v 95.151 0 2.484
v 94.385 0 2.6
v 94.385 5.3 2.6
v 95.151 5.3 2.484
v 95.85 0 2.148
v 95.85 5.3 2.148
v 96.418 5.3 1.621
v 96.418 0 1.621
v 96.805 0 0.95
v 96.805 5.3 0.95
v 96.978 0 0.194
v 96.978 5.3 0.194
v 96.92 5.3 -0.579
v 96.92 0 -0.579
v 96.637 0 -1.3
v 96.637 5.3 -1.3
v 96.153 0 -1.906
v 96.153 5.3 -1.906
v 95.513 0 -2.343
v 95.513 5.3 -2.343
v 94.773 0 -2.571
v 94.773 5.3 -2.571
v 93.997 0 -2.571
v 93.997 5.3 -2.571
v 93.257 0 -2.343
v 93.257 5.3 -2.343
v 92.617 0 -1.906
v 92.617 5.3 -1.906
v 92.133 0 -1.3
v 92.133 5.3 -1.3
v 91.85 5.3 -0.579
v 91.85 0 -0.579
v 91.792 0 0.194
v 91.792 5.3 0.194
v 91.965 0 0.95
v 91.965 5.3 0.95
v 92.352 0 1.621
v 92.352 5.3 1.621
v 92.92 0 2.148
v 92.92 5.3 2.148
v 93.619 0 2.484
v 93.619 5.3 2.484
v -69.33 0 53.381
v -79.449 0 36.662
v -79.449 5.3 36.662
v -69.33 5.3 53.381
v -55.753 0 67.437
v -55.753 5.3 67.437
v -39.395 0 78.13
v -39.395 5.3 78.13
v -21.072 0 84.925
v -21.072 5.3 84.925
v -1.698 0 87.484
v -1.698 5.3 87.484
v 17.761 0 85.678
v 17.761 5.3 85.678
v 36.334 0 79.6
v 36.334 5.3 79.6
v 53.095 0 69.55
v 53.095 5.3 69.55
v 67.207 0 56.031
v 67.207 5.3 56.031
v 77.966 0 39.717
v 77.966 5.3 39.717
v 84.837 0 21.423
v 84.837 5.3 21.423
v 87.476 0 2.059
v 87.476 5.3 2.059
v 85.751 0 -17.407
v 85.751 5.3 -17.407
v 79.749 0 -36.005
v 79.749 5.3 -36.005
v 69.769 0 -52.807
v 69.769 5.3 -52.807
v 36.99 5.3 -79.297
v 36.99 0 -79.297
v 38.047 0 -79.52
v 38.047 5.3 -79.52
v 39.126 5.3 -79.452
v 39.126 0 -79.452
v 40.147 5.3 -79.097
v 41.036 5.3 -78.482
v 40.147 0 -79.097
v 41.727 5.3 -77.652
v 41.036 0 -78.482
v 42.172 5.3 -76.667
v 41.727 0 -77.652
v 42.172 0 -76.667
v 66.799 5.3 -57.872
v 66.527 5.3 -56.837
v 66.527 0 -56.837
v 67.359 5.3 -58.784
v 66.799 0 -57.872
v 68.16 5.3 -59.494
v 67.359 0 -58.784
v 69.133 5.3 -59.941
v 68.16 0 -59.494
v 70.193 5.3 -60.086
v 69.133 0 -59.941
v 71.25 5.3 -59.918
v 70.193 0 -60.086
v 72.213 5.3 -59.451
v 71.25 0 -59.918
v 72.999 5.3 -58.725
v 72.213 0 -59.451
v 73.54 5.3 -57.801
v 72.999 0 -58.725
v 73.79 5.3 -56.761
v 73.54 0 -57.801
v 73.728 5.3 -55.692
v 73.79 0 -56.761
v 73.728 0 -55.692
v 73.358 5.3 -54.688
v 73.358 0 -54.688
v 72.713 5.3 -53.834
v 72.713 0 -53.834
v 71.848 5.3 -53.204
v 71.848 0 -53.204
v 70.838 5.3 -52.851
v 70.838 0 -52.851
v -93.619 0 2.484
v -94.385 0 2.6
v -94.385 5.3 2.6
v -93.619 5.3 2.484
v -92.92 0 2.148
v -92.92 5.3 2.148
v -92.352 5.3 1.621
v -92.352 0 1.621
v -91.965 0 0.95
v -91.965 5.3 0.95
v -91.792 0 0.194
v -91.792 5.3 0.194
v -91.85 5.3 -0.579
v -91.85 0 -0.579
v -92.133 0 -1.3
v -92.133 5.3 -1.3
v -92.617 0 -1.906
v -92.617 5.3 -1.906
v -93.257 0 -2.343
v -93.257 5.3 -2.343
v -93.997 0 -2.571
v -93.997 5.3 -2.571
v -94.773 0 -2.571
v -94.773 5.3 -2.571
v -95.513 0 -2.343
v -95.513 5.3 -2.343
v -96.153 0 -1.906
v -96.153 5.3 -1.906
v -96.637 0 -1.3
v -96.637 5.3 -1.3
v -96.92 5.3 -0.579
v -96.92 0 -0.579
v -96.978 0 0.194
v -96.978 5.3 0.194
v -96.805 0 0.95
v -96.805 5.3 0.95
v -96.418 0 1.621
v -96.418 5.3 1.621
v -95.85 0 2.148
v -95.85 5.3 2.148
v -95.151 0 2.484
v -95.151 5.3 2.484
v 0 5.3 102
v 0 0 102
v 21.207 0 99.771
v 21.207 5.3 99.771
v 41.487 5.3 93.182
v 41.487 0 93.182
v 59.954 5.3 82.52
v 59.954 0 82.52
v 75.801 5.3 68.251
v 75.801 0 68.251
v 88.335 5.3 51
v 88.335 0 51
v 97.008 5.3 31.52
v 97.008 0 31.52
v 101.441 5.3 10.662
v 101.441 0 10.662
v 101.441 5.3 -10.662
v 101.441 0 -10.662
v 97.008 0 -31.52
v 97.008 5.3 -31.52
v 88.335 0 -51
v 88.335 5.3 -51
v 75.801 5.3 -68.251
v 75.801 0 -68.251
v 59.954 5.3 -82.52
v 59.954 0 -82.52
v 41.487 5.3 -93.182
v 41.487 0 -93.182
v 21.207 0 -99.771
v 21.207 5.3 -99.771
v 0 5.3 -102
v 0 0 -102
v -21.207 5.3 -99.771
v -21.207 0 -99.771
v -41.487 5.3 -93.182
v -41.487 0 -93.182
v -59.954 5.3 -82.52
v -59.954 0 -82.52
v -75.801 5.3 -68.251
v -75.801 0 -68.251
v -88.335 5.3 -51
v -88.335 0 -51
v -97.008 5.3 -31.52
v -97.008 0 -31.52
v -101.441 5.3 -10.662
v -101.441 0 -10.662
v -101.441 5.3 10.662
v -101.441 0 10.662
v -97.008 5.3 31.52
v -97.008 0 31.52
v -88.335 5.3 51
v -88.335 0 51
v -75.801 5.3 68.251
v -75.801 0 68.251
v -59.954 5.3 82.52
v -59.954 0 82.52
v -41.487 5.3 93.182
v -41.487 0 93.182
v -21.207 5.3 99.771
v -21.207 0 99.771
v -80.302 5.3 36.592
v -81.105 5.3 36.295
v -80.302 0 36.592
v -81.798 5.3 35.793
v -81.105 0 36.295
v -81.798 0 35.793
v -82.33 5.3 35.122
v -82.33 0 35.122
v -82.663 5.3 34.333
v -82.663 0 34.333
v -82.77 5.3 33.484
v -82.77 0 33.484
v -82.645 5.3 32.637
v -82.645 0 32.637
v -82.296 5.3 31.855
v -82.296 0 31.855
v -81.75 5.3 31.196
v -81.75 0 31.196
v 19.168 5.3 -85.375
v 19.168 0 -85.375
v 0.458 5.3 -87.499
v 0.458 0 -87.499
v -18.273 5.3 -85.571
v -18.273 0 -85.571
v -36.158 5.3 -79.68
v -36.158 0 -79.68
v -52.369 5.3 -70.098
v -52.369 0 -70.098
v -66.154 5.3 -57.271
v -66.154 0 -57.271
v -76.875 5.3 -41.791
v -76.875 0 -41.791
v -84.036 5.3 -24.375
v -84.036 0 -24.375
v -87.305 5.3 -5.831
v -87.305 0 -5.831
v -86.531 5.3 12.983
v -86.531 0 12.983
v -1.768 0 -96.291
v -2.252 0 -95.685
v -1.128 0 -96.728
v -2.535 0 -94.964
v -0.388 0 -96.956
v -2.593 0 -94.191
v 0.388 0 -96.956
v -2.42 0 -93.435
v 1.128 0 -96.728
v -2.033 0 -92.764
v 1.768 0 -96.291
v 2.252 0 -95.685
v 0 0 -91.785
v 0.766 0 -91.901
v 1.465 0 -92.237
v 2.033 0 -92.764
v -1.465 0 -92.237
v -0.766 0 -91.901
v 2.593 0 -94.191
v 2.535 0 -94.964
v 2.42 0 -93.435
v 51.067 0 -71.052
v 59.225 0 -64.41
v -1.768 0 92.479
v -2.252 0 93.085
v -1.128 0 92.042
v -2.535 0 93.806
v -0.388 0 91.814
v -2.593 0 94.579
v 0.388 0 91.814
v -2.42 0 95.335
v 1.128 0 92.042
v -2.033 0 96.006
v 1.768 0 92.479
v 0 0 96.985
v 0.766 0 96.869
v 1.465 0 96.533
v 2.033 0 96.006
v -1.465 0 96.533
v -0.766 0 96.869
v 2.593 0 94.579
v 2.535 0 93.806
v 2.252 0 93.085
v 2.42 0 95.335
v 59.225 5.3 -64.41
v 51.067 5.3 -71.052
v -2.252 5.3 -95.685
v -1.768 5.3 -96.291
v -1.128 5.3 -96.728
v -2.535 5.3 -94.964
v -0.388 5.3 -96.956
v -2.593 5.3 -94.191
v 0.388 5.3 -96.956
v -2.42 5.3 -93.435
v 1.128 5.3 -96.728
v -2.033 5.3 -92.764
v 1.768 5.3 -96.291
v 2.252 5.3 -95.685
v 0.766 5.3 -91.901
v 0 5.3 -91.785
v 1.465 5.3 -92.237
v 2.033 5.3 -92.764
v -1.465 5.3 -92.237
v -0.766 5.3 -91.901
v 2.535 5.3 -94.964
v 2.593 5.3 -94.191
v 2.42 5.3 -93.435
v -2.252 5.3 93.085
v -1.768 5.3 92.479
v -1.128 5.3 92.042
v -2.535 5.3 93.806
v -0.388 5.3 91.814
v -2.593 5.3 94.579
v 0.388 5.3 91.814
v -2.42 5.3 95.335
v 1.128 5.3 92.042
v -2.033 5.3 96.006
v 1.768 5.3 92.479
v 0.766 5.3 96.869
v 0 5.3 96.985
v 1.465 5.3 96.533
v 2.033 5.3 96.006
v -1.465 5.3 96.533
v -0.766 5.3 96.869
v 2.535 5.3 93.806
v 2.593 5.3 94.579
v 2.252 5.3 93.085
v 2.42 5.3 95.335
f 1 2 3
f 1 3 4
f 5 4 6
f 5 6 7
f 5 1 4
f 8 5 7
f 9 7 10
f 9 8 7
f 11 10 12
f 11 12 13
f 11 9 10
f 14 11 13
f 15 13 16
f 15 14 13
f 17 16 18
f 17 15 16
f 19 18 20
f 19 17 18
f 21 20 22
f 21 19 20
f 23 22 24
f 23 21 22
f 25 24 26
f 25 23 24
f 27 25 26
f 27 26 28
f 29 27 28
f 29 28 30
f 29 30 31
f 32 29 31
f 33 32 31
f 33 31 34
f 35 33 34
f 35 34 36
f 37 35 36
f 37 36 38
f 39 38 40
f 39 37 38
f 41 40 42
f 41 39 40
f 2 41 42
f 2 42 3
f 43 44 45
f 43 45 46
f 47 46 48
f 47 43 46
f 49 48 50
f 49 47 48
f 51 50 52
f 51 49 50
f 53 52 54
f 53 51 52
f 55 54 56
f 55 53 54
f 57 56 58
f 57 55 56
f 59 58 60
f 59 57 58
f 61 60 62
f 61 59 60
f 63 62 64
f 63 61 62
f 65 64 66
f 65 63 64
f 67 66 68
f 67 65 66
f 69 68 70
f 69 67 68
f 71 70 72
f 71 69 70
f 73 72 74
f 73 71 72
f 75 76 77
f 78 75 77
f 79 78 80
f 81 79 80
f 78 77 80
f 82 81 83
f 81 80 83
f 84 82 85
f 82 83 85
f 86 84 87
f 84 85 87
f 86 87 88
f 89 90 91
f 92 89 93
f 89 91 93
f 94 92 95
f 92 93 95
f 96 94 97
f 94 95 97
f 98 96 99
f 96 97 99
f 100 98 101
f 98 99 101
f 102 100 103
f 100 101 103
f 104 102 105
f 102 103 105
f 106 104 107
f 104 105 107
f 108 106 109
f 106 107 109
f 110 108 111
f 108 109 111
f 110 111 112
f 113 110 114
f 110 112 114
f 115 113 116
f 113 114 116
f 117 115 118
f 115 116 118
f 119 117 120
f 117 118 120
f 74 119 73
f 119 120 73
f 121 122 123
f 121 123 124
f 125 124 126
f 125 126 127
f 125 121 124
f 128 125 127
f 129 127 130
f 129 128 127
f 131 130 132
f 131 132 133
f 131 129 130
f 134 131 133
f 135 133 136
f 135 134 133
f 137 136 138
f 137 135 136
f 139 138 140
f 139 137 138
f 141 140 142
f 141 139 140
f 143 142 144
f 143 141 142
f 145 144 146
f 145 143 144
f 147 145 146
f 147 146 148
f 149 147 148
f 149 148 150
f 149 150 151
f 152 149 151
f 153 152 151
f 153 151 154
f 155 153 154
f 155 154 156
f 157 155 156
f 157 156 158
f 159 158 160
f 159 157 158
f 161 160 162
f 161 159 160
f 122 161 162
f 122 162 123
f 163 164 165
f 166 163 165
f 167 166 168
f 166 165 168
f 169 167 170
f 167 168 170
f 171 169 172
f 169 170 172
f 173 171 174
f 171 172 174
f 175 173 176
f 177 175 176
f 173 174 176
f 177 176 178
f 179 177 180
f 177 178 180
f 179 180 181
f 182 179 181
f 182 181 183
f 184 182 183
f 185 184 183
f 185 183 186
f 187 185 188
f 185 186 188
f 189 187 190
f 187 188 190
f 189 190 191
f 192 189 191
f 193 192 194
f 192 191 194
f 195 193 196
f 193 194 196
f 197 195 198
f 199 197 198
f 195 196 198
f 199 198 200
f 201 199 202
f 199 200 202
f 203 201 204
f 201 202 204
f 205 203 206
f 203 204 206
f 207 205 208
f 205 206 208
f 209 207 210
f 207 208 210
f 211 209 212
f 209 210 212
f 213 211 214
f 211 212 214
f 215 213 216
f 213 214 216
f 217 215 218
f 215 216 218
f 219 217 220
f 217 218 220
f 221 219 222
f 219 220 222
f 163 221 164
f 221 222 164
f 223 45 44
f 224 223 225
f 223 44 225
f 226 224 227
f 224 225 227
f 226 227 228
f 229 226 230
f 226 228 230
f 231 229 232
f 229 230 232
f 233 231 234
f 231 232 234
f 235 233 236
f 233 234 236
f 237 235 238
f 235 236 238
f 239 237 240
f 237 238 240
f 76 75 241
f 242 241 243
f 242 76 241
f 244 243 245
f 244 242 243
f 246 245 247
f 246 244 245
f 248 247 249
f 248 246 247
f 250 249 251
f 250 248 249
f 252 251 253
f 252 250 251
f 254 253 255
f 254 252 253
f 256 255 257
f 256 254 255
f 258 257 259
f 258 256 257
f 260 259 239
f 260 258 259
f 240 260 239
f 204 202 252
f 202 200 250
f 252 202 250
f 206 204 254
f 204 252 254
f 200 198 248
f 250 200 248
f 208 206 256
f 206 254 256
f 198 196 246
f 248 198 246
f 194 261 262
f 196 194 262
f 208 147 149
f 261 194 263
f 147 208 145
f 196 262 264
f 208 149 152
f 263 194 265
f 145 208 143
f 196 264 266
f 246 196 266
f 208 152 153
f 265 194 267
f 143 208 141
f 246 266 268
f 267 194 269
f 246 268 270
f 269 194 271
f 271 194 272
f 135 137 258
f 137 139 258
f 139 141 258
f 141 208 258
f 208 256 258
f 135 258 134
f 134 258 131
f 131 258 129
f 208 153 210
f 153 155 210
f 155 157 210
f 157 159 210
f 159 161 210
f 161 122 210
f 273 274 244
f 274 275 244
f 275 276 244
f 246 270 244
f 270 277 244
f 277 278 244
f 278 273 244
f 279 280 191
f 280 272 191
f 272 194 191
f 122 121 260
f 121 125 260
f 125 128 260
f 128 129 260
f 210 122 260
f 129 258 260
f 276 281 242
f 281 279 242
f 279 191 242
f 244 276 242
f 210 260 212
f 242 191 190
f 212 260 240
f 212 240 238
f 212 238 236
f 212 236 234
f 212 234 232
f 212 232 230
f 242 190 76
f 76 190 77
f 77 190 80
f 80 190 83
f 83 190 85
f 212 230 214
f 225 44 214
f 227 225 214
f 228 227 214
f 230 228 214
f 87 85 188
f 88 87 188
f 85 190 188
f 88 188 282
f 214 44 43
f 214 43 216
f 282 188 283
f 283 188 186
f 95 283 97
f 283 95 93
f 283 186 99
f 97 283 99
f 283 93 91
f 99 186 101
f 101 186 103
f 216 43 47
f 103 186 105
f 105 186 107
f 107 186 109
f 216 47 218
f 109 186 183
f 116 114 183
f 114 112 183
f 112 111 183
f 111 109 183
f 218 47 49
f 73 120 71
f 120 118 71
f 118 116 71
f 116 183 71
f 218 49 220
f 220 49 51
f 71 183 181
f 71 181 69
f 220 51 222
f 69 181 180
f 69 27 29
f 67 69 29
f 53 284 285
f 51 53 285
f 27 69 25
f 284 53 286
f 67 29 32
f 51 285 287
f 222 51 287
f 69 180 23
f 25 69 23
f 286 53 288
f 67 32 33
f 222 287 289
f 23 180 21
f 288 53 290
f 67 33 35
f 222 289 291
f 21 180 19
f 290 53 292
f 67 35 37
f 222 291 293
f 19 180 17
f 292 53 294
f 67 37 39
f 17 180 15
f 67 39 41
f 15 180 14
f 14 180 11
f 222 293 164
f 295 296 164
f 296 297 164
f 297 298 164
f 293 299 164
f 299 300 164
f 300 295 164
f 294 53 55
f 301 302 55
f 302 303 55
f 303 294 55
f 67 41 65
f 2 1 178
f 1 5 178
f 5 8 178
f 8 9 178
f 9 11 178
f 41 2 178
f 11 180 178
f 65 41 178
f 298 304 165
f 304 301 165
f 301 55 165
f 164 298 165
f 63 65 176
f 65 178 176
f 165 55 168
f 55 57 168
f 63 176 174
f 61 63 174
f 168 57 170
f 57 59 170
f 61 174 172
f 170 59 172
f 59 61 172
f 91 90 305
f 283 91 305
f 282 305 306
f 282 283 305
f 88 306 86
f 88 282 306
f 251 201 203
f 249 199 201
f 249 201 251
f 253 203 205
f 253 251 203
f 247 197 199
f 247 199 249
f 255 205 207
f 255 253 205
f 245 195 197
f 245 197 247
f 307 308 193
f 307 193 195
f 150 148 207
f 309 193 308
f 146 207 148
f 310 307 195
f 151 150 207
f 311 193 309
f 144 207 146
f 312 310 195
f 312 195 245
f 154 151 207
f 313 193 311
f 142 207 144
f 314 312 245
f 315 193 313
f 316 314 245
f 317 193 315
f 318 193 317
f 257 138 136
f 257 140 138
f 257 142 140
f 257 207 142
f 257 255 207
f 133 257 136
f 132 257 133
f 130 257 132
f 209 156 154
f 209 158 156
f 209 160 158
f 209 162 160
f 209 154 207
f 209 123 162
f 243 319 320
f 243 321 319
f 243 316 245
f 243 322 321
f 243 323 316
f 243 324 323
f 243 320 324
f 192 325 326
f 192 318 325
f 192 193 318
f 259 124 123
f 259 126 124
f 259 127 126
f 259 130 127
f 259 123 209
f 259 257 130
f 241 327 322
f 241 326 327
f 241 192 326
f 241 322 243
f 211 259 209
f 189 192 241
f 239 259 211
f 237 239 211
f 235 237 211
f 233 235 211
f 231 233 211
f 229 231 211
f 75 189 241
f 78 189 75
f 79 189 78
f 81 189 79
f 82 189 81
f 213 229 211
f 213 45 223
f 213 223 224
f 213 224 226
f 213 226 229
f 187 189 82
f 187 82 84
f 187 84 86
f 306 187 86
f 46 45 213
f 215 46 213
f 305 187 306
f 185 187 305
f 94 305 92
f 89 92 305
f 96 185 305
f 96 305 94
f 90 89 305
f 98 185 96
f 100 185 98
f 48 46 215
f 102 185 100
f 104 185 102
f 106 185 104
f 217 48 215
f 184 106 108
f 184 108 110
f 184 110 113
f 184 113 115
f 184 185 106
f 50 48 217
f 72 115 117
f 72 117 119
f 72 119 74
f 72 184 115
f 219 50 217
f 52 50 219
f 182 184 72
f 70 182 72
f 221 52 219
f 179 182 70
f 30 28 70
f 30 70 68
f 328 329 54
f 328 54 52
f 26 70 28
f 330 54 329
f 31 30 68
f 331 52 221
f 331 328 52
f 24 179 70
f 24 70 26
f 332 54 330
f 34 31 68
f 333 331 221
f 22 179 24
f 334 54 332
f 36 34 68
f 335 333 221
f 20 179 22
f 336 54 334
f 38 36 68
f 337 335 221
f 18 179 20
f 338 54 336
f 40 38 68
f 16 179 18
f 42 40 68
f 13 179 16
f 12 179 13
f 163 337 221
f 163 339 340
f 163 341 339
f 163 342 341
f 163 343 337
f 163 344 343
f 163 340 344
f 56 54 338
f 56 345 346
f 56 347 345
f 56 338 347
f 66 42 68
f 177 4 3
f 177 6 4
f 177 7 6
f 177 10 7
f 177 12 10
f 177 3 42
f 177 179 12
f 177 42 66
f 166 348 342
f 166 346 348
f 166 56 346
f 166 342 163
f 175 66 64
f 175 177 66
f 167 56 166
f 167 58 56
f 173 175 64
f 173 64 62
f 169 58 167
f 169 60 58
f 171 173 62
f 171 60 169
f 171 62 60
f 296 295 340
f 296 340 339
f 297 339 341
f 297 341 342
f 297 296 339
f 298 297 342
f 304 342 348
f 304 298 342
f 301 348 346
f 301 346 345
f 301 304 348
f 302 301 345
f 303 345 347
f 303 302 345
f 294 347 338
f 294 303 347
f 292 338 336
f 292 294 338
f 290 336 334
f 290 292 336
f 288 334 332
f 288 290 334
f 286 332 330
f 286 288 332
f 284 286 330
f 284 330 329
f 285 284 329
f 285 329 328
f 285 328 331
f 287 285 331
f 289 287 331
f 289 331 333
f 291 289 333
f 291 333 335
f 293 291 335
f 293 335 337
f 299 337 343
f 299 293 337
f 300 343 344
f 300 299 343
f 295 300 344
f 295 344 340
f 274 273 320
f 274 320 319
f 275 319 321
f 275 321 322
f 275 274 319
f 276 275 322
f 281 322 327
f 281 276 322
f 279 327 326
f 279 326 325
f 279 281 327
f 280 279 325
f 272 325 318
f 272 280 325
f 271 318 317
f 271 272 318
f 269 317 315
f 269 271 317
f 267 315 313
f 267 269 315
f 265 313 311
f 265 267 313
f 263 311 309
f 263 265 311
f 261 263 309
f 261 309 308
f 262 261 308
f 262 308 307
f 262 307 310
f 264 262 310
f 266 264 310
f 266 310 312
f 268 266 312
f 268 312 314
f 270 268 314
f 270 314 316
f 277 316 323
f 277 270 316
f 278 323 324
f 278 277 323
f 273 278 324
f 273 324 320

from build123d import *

# Parameters (mm, degrees)
SKETCH_1_R          = 102
SKETCH_1_R_2        = 87.5
SKETCH_1_R_3        = 2.6
EXTRUDE_1_DEPTH     = 5.3
SKETCH_2_R          = 3.65
SKETCH_2_R_2        = 3.15
SKETCH_2_R_3        = 4
CUT_EXTRUDE_1_DEPTH = 145.347116355


with BuildPart() as part:
    # 草图1 → 凸台-拉伸1 (new body)
    with BuildSketch(Plane(origin=(0, 0, 0), x_dir=(1, 0, 0), z_dir=(0, 1, 0))):
        with Locations(Location((0, 0, 0), (0, 0, 270))):
            Circle(SKETCH_1_R)
        with Locations(Location((0, 0, 0), (0, 0, 270))):
            Circle(SKETCH_1_R_2, mode=Mode.SUBTRACT)
        with Locations(Location((0, 94.385, 0), (0, 0, 270))):
            Circle(SKETCH_1_R_3, mode=Mode.SUBTRACT)
        with Locations(Location((94.385, 0, 0), (0, 0, 270))):
            Circle(SKETCH_1_R_3, mode=Mode.SUBTRACT)
        with Locations(Location((0, -94.385, 0), (0, 0, 270))):
            Circle(SKETCH_1_R_3, mode=Mode.SUBTRACT)
        with Locations(Location((-94.385, 0, 0), (0, 0, 270))):
            Circle(SKETCH_1_R_3, mode=Mode.SUBTRACT)
    extrude(amount=EXTRUDE_1_DEPTH)

    # 草图2 → 切除-拉伸1 (cut, through all)
    with BuildSketch(Plane.XZ):
        with Locations((70.154572481, -56.436700926)):
            Circle(SKETCH_2_R)
        with Locations((-79.620223562, 33.516861428)):
            Circle(SKETCH_2_R_2)
        with Locations((38.336469882, -75.530286573)):
            Circle(SKETCH_2_R_3)
    extrude(amount=-CUT_EXTRUDE_1_DEPTH, mode=Mode.SUBTRACT)


solid = part.part
